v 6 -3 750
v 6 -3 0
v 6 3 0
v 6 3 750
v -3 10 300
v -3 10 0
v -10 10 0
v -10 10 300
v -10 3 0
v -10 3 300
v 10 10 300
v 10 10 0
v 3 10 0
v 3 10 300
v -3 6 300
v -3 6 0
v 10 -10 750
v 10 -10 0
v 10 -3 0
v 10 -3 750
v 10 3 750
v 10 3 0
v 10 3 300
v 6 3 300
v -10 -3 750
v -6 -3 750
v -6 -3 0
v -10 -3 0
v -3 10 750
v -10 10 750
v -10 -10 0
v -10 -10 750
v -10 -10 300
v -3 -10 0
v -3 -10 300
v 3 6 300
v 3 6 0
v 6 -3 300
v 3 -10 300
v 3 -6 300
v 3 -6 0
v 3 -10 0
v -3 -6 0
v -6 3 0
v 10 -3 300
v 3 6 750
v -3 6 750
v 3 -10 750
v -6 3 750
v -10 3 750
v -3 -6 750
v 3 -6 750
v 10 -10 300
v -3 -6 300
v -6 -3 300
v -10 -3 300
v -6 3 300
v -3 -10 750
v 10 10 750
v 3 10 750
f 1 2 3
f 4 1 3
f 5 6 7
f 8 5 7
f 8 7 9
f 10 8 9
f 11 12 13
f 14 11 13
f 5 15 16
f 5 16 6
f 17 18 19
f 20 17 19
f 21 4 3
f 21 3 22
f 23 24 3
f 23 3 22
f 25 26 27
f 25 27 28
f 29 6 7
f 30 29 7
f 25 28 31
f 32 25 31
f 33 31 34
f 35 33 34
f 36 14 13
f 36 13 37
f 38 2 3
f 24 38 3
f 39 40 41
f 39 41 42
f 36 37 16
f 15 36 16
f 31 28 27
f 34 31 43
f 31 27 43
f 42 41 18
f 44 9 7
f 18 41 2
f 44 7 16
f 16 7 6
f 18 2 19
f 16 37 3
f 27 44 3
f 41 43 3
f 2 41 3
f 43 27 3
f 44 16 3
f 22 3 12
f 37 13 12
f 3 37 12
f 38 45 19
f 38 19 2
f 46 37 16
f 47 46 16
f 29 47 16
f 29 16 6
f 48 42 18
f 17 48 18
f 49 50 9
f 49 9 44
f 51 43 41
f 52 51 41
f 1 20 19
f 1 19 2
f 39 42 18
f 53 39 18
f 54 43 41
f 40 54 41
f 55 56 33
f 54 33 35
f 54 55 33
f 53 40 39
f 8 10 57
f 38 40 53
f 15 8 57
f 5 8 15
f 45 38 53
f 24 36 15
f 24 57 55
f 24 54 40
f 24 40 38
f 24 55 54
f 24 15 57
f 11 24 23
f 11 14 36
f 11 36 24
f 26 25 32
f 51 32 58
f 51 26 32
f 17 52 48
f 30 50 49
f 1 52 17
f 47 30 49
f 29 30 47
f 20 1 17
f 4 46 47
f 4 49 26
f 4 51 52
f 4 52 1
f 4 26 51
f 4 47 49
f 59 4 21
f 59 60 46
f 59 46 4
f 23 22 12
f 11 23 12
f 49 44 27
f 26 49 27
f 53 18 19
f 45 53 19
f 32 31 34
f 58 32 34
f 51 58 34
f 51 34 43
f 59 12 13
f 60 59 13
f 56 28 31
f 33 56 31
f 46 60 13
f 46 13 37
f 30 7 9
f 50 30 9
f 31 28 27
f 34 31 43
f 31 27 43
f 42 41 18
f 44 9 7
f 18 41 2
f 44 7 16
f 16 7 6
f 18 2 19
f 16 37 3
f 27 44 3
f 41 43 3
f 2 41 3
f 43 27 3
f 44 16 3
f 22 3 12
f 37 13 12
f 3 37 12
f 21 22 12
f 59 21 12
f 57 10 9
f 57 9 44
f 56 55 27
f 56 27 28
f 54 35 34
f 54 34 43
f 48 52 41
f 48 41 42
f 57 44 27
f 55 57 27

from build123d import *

# Parameters (mm, degrees)
F1_DEPTH = 750
F2_DEPTH = 300


with BuildPart() as f1:
    # F0 (on Top) → F1 (new body)
    with BuildSketch(Plane.XY):
        Polygon((3, -10), (10, -10), (10, -3), (6, -3), (6, 3), (10, 3), (10, 10), (3, 10), (3, 6), (-3, 6), (-3, 10), (-10, 10), (-10, 3), (-6, 3), (-6, -3), (-10, -3), (-10, -10), (-3, -10), (-3, -6), (3, -6), align=None)
    extrude(amount=F1_DEPTH)


with BuildPart() as f2:
    # F0 (on Top) → F2 (new body)
    with BuildSketch(Plane.XY):
        Polygon((3, -10), (10, -10), (10, -3), (6, -3), (6, 3), (10, 3), (10, 10), (3, 10), (3, 6), (-3, 6), (-3, 10), (-10, 10), (-10, 3), (-6, 3), (-6, -3), (-10, -3), (-10, -10), (-3, -10), (-3, -6), (3, -6), align=None)
    extrude(amount=F2_DEPTH)


solid = Compound([f1.part, f2.part])
